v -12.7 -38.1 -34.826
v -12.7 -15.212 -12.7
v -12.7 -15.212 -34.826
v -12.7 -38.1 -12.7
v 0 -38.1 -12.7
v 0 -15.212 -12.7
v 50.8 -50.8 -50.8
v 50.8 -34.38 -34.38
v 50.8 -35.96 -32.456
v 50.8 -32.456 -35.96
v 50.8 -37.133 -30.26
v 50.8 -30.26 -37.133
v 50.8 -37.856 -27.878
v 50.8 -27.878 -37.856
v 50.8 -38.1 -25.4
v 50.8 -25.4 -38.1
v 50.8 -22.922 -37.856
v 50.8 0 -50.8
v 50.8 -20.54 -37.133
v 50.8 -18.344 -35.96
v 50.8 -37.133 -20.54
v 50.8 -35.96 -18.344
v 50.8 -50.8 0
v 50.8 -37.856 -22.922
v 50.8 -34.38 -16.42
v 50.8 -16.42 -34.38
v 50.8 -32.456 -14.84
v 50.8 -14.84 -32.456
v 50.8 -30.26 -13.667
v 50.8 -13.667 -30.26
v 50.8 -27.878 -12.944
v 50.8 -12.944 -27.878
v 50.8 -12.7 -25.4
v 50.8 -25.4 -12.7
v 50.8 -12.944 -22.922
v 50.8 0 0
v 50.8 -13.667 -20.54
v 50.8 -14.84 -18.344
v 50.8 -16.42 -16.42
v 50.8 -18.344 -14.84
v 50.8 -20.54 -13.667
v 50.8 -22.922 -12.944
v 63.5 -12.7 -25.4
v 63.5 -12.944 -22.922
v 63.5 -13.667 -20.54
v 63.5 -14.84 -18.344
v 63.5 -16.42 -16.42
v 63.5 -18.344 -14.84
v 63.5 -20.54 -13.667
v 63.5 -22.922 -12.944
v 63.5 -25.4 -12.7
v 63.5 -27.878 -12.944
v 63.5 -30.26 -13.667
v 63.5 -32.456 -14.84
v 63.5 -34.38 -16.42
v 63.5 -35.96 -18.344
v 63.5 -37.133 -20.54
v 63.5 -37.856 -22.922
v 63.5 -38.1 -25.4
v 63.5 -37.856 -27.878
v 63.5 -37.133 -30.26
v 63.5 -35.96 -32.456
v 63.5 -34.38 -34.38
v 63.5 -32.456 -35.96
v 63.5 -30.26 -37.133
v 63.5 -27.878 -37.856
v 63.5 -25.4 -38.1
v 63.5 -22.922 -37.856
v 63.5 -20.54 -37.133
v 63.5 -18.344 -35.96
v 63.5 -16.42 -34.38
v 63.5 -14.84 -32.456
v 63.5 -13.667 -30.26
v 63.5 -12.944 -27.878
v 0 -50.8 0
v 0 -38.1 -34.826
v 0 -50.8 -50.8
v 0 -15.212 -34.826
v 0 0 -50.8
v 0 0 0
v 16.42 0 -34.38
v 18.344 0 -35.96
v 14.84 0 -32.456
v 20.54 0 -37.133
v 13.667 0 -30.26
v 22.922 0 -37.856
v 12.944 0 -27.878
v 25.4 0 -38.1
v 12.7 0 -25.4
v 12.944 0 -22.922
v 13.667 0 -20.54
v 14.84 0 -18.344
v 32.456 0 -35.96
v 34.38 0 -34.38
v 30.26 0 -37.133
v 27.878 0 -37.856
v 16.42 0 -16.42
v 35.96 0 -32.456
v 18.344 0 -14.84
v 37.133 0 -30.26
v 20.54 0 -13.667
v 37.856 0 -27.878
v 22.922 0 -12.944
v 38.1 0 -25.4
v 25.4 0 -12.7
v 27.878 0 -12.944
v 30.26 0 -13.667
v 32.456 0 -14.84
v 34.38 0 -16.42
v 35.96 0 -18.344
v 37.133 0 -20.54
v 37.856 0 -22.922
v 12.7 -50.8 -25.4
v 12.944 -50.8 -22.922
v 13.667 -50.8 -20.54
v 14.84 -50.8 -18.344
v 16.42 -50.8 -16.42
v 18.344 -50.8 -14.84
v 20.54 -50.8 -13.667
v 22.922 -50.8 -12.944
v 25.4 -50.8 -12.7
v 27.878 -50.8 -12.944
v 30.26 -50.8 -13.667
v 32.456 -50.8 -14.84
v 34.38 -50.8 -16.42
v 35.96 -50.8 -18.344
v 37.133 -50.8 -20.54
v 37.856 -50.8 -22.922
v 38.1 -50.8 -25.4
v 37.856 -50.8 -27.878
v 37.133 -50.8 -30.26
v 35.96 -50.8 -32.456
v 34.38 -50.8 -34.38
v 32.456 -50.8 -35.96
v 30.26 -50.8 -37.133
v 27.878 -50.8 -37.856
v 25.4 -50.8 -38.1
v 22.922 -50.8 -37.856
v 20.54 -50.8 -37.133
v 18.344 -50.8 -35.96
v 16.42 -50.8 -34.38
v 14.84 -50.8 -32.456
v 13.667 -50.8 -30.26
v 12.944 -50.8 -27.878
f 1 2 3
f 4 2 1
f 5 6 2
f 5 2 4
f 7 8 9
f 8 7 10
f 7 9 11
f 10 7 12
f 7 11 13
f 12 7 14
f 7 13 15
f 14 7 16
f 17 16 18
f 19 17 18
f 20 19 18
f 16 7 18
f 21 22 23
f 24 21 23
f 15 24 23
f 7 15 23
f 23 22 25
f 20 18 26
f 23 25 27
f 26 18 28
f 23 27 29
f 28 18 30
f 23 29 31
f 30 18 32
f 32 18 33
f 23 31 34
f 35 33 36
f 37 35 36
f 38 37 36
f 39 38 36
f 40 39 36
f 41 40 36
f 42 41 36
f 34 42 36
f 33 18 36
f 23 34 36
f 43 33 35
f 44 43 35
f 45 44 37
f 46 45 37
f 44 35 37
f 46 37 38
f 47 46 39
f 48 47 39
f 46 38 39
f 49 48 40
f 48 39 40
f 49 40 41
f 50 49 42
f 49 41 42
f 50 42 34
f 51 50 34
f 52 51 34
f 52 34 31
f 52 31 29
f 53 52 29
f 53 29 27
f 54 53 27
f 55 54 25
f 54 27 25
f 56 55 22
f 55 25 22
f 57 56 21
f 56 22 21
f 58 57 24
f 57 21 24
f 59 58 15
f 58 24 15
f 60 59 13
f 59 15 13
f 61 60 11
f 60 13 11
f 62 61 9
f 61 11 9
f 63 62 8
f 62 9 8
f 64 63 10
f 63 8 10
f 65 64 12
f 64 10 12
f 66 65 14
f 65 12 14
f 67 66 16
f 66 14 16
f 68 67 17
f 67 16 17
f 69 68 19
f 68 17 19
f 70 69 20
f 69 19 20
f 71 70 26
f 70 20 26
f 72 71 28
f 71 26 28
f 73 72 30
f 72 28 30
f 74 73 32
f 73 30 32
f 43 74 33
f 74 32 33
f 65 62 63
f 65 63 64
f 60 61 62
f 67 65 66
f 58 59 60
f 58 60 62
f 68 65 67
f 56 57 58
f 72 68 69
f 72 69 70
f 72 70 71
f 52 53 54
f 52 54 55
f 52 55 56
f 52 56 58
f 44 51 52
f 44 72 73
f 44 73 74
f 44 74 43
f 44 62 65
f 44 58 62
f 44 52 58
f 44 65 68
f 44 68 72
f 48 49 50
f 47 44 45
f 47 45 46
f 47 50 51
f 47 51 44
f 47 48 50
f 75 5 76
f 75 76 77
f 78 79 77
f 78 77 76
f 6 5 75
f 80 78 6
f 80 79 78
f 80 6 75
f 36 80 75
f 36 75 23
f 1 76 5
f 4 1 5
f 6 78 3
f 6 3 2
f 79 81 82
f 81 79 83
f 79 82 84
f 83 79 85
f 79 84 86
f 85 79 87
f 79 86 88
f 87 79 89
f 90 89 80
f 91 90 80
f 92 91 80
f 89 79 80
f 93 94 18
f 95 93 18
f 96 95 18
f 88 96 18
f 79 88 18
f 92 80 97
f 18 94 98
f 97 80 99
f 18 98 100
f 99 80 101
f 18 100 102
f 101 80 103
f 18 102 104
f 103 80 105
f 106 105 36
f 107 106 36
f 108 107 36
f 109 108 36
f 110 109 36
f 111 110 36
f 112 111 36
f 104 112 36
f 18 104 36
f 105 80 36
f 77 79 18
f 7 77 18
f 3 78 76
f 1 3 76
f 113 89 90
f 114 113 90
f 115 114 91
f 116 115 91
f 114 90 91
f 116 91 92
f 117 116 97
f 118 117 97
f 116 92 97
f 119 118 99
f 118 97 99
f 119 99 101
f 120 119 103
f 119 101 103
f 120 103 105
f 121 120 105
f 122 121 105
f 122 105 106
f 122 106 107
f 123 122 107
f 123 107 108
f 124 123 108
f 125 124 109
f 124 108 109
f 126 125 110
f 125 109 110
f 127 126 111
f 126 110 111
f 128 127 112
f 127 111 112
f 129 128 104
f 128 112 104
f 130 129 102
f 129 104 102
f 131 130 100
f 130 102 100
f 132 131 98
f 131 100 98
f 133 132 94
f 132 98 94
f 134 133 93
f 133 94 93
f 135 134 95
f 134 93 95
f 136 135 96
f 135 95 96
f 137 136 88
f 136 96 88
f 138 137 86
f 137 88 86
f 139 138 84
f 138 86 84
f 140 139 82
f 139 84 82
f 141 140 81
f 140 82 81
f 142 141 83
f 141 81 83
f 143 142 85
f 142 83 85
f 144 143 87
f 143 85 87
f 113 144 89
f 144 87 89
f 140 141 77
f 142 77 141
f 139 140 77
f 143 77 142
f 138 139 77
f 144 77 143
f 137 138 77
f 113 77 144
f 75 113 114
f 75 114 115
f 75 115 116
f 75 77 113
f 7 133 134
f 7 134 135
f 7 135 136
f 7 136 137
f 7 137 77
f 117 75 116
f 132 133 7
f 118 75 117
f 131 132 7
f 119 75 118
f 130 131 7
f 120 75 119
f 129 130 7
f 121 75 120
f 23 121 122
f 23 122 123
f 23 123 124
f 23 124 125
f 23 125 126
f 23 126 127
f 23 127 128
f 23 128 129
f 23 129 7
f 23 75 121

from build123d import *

# Parameters (mm, degrees)
F0_W     = 50.8
F0_H     = 50.8
F1_DEPTH = 50.8
F2_R     = 12.7
F3_DEPTH = 50.8
F4_W     = 22.8882213071
F4_H     = 22.126223892
F5_DEPTH = 12.7
F6_R     = 12.7
F7_DEPTH = 12.7


with BuildPart() as f1:
    # F0 (on Front) → F1 (new body)
    with BuildSketch(Plane.XZ):
        with Locations((25.4, -25.4)):
            Rectangle(F0_W, F0_H)
    extrude(amount=F1_DEPTH)

    # F2 (on face) → F3 (cut)
    with BuildSketch(Plane(origin=(0, 0, 0), x_dir=(-1, 0, 0), z_dir=(0, 1, 0))):
        with Locations((-25.4, -25.4)):
            Circle(F2_R)
    extrude(amount=-F3_DEPTH, mode=Mode.SUBTRACT)

    # F4 (on face) → F5 (join)
    with BuildSketch(Plane(origin=(0, 0, 0), x_dir=(0, -1, 0), z_dir=(-1, 0, 0))):
        with Locations((26.6558893465, -23.763111946)):
            Rectangle(F4_W, F4_H)
    extrude(amount=F5_DEPTH)

    # F6 (on face) → F7 (join)
    with BuildSketch(Plane.YZ.offset(50.8)):
        with Locations((-25.4, -25.4)):
            Circle(F6_R)
    extrude(amount=F7_DEPTH)


solid = f1.part
